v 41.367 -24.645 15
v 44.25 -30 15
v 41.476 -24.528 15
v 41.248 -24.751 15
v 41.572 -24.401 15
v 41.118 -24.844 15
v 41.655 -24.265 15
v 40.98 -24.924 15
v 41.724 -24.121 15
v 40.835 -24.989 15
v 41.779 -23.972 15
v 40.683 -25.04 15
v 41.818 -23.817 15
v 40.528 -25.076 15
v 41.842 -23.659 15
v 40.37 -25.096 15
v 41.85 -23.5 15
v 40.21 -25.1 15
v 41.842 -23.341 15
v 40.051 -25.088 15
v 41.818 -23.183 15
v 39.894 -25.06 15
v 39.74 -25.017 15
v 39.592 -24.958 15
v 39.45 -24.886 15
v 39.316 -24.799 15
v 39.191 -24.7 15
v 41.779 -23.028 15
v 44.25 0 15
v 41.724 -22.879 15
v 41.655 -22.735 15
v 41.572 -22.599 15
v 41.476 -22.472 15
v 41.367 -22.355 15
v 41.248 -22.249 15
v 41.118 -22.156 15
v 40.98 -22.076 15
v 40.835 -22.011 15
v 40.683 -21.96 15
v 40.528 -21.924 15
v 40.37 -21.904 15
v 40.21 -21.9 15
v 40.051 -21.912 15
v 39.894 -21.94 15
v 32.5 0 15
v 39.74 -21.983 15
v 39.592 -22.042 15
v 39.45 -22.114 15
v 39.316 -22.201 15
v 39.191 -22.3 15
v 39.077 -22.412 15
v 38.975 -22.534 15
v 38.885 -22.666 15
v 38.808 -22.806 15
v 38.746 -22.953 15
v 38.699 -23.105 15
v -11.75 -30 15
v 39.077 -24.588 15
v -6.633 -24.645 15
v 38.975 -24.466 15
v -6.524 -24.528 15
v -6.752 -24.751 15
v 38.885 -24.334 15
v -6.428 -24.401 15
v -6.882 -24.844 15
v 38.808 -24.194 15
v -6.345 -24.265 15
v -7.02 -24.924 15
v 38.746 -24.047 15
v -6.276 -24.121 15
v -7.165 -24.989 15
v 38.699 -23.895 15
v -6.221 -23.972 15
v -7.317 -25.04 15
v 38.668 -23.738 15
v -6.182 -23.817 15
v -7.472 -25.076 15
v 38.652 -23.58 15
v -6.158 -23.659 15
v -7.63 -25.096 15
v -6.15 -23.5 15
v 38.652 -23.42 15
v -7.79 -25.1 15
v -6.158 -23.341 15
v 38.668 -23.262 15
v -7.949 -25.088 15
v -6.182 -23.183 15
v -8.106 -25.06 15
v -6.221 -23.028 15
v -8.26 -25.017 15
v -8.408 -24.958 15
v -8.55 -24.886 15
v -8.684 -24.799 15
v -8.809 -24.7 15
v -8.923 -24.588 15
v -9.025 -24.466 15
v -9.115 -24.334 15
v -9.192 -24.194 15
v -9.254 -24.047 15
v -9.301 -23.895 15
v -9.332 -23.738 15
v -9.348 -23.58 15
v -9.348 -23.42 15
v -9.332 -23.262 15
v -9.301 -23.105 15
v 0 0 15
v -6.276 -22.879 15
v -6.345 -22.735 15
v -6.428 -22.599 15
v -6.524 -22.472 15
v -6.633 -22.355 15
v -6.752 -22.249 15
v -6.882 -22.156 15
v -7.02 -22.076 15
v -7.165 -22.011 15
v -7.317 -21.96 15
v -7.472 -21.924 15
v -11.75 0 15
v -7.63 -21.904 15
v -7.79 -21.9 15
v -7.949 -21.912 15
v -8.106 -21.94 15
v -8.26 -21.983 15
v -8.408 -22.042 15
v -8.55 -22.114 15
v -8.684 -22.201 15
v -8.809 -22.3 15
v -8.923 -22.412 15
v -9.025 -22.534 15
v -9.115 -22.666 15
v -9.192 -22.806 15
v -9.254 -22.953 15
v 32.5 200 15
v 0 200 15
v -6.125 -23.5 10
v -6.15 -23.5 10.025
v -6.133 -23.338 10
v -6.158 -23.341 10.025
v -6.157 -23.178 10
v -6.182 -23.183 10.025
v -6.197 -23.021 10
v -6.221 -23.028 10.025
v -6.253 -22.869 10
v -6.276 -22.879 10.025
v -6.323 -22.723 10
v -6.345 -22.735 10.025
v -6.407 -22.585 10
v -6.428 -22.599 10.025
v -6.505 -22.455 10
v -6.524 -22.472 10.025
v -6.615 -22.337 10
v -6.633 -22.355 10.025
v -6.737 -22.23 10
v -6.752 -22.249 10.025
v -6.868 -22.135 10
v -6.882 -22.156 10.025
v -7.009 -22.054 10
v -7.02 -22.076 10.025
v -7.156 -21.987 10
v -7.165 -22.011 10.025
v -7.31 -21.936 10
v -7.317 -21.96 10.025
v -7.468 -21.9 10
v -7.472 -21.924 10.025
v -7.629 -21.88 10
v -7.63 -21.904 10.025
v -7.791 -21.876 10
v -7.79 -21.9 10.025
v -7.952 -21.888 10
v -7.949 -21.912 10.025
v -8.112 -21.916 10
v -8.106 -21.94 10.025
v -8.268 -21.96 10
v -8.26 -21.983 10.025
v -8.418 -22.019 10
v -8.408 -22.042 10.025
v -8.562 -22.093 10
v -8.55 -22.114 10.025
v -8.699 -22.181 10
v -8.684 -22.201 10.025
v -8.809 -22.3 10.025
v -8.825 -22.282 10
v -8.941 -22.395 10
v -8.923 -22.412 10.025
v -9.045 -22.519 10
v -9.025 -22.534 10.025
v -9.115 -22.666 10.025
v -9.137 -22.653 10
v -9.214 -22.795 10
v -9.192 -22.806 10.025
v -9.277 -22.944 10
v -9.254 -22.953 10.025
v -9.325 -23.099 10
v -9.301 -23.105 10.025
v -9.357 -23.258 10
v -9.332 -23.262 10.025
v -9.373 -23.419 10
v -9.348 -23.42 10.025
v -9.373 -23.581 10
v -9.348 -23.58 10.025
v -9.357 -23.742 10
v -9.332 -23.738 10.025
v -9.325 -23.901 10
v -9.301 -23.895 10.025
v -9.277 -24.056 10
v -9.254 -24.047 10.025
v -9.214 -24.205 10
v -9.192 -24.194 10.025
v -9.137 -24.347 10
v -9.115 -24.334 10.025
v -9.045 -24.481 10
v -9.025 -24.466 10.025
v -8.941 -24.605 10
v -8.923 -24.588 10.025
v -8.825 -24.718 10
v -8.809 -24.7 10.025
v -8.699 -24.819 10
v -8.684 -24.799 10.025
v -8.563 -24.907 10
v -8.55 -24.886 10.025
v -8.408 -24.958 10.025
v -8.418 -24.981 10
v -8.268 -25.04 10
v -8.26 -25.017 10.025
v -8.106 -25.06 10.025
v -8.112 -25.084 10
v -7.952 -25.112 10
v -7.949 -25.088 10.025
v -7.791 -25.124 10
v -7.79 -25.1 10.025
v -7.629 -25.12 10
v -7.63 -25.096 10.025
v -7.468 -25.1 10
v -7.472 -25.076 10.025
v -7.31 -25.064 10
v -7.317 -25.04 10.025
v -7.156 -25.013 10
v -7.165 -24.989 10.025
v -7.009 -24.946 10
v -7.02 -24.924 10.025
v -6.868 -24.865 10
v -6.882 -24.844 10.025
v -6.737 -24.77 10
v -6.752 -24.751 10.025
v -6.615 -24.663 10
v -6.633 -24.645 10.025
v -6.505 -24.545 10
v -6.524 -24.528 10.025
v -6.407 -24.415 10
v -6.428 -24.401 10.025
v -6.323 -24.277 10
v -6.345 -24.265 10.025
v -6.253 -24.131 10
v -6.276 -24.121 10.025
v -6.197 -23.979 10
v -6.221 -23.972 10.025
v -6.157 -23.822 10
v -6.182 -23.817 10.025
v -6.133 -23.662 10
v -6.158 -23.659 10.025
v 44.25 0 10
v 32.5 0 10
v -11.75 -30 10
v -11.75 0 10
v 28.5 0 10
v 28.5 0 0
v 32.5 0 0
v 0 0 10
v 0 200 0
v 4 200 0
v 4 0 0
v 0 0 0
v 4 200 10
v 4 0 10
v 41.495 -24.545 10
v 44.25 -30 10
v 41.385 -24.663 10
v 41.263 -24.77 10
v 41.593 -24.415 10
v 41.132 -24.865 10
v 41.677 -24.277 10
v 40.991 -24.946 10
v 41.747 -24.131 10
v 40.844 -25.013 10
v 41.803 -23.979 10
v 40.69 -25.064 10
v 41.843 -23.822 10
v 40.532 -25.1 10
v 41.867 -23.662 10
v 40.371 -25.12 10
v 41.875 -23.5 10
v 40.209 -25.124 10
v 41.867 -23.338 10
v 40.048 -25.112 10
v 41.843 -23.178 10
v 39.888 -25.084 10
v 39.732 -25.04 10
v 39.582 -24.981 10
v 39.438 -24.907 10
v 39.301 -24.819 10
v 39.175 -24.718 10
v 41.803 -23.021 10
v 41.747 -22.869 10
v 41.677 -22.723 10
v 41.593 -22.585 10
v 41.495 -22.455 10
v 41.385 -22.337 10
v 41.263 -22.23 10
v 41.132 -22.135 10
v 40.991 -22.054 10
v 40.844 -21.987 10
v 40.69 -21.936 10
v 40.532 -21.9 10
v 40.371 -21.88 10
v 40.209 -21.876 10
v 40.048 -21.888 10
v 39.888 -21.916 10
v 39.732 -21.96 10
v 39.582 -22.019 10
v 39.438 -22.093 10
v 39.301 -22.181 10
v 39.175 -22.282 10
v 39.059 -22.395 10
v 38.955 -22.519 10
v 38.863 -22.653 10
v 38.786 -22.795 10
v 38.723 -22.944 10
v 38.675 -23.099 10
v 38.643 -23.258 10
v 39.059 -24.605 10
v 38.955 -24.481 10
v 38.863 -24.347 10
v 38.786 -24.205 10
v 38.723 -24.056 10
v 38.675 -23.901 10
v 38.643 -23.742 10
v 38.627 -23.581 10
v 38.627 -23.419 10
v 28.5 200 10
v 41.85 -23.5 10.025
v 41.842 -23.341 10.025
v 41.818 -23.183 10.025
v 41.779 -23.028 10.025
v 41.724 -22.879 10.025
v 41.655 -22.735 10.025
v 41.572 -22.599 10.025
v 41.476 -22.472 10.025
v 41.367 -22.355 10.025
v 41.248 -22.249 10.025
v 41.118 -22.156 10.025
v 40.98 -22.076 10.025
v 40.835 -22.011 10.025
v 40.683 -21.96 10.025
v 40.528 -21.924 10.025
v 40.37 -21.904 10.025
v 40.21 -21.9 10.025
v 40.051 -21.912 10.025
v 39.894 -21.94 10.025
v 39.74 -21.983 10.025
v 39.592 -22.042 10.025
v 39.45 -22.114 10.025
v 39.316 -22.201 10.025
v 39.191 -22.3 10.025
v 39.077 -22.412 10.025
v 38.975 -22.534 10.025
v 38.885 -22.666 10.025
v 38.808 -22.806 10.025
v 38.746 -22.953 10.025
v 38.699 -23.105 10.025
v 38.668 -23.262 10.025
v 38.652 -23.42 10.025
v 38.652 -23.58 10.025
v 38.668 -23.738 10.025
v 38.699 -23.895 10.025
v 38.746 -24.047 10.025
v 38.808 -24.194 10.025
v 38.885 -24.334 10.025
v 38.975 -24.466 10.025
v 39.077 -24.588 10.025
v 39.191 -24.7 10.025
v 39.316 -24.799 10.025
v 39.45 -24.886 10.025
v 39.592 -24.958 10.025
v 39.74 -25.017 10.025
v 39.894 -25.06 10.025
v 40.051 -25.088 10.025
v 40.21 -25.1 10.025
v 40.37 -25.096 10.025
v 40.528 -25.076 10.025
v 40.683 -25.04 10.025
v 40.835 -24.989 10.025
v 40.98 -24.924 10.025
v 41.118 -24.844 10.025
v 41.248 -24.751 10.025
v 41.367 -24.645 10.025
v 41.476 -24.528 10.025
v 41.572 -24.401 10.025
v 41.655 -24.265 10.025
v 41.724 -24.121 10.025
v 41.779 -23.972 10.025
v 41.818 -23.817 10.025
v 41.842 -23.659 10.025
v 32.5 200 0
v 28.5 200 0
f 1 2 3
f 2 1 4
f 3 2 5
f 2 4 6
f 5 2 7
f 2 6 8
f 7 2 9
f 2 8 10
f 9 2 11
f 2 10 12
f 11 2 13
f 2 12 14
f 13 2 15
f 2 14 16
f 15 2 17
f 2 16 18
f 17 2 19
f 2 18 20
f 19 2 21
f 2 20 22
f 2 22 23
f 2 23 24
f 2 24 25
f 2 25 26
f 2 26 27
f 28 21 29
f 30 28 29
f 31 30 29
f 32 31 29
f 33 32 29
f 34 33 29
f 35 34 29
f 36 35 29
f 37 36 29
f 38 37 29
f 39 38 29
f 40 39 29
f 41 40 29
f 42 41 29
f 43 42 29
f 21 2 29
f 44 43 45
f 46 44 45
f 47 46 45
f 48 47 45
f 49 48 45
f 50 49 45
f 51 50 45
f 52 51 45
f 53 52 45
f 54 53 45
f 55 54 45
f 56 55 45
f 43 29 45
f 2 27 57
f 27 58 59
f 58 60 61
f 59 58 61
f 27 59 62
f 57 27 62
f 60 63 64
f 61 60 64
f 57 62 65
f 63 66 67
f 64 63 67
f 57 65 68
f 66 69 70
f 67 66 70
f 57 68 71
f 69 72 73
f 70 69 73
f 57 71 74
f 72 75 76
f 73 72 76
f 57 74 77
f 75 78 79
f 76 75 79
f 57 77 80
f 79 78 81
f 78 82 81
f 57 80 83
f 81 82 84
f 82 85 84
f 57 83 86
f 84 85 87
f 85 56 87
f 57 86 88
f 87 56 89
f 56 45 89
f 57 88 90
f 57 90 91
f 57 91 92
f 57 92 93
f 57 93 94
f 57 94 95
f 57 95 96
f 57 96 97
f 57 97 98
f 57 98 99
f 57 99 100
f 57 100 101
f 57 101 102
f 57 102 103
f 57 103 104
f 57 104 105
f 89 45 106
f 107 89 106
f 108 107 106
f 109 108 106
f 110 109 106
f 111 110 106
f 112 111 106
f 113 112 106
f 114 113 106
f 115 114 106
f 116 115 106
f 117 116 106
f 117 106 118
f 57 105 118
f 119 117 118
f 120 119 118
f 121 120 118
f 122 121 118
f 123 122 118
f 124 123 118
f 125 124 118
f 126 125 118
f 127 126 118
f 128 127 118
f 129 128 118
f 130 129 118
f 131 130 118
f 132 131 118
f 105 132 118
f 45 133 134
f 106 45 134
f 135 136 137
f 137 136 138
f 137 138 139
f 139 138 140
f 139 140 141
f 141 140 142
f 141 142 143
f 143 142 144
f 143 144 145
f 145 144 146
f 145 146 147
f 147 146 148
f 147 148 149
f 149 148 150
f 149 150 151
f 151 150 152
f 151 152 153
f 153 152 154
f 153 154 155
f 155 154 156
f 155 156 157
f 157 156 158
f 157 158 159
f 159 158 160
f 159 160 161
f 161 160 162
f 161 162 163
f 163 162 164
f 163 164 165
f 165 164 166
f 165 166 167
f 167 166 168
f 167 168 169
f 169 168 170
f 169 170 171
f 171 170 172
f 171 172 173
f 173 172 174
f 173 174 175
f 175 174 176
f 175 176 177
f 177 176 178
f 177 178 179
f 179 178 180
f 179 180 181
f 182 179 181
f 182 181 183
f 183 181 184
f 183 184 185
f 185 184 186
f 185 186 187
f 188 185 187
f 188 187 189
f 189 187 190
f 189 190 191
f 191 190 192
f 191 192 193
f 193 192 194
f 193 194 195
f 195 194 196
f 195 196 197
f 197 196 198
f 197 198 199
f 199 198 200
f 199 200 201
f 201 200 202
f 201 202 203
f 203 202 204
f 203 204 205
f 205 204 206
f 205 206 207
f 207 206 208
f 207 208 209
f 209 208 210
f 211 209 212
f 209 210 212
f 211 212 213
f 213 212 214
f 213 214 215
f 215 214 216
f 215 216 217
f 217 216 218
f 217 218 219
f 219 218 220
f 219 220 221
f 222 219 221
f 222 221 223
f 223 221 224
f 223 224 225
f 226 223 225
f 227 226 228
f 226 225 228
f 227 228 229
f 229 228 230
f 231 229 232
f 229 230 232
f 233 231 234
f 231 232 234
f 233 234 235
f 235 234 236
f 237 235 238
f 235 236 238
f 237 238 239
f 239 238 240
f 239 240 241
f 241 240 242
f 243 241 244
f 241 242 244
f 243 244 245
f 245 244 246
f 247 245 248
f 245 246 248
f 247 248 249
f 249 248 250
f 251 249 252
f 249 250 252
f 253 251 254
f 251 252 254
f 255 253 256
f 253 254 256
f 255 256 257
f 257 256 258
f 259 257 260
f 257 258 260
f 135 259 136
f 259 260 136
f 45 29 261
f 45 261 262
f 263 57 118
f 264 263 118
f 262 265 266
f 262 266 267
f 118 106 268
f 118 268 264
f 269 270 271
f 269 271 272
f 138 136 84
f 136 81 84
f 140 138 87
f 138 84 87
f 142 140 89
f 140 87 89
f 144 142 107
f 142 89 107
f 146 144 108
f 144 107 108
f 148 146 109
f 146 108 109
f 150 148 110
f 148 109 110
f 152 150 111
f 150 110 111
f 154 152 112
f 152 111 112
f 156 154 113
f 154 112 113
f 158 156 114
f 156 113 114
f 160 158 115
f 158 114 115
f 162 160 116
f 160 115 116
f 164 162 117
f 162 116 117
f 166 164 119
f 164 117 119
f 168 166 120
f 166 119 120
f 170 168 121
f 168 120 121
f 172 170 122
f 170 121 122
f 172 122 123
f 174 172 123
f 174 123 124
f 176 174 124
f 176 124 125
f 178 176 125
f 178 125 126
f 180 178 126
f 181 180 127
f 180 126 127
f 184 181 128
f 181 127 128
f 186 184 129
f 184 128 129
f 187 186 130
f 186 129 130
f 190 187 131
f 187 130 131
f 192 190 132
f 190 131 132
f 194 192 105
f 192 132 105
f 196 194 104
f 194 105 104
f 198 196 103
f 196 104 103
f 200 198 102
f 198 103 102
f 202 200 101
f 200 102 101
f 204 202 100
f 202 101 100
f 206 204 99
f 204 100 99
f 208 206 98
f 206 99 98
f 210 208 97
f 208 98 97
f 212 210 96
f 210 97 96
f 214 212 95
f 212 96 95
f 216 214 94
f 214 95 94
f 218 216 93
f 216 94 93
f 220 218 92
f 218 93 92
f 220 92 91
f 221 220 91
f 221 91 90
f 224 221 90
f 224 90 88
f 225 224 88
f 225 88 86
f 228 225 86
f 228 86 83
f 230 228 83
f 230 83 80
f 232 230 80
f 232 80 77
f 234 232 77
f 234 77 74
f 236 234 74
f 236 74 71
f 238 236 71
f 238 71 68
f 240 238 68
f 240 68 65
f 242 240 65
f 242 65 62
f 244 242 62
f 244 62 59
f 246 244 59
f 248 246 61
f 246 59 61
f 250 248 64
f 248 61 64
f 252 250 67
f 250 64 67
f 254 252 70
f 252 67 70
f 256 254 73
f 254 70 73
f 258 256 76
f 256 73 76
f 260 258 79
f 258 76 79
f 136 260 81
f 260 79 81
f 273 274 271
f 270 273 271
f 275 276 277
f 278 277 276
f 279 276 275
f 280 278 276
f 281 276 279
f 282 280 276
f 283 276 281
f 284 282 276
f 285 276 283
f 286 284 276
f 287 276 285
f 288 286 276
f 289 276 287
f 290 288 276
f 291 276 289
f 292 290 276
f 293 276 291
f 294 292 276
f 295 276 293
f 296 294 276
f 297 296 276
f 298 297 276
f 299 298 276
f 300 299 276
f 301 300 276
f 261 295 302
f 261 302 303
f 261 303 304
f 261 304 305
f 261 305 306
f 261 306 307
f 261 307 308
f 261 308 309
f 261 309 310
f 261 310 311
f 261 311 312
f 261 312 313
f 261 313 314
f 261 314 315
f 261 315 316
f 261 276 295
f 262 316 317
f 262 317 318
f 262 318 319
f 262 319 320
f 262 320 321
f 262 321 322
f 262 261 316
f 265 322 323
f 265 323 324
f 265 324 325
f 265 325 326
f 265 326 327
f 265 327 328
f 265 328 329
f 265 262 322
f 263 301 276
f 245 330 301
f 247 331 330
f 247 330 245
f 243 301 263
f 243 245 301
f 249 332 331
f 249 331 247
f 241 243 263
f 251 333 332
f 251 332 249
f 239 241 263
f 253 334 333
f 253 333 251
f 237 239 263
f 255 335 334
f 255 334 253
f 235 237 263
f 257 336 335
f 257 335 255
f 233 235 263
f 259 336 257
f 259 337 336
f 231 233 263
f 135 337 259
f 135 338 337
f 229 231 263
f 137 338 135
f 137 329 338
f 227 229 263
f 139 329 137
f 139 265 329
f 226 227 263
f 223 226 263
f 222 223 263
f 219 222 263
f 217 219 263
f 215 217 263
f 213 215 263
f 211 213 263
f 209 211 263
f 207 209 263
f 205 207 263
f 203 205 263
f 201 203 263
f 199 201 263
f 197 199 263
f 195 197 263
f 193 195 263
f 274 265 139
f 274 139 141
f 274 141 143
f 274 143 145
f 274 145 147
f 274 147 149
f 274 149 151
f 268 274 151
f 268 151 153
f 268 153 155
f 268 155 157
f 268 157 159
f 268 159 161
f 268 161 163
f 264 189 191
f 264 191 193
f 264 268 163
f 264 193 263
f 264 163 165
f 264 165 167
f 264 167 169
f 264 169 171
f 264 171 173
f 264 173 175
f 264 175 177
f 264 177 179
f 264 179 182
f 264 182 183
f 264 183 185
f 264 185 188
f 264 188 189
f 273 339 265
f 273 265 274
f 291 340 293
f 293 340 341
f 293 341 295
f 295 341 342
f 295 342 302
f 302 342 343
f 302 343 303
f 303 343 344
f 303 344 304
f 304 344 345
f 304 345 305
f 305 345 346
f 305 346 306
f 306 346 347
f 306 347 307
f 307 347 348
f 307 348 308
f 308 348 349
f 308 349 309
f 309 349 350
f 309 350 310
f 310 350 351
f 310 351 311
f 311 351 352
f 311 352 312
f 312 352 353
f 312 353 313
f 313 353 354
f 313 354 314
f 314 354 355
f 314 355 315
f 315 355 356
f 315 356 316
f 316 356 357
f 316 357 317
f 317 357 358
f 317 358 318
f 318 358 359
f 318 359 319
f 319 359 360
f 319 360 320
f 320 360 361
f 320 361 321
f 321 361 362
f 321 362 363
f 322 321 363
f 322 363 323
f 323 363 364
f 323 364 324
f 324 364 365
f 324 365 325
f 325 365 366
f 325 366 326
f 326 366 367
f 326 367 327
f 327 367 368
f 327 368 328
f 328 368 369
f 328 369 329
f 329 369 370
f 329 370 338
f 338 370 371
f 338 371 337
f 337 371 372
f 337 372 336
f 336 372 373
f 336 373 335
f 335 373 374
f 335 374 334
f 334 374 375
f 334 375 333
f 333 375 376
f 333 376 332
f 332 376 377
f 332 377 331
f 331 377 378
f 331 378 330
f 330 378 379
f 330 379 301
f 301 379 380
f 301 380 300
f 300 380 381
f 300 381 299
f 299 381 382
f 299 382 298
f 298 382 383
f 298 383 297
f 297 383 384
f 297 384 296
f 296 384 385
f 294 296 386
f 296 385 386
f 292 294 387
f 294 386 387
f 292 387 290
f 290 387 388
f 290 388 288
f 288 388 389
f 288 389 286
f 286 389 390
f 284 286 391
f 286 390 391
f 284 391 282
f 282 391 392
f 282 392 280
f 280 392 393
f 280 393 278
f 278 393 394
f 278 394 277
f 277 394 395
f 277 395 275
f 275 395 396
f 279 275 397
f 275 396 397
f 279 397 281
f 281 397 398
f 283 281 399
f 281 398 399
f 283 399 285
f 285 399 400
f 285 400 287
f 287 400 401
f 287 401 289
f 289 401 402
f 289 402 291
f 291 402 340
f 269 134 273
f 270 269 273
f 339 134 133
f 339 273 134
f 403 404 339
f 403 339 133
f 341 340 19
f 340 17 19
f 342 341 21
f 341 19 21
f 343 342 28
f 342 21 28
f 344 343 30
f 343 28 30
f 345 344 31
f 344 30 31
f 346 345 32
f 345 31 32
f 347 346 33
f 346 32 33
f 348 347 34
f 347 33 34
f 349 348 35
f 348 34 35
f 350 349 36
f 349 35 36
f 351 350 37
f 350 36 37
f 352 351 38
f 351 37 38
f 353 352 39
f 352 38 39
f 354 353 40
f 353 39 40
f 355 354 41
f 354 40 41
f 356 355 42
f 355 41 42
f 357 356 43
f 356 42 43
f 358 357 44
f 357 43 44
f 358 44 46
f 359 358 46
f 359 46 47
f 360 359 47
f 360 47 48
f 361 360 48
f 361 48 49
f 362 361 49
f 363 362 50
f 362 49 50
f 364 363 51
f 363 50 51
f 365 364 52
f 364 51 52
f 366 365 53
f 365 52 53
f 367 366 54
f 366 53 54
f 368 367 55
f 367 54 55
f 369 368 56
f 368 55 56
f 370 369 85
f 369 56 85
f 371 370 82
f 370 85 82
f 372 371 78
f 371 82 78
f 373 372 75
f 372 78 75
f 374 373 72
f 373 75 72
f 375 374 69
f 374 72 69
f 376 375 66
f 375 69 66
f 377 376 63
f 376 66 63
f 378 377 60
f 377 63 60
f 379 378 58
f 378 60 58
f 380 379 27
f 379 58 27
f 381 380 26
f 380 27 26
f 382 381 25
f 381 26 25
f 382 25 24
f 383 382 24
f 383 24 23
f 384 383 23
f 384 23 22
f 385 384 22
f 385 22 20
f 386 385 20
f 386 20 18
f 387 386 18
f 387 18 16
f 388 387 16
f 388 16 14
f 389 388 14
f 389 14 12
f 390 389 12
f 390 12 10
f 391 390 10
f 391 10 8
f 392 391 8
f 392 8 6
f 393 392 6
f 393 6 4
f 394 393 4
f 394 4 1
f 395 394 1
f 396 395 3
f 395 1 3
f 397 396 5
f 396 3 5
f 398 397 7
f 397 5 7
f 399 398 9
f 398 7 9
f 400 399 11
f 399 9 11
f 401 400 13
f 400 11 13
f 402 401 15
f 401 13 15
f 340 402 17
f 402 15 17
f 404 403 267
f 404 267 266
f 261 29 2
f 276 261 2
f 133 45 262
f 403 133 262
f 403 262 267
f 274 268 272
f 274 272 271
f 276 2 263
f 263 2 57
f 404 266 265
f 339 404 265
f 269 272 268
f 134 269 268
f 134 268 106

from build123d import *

# Parameters (mm, degrees)
BOSS_EXTRUDE1_DEPTH            = 200
BOSS_EXTRUDE2_DEPTH            = 5
M3_CLEARANCE_HOLE1_D           = 3.2
M3_CLEARANCE_HOLE1_CSINK_D     = 3.25
M3_CLEARANCE_HOLE1_CSINK_ANGLE = 90


with BuildPart() as part:
    # Sketch1 → Boss-Extrude1 (new body)
    with BuildSketch(Plane(origin=(0, 0, 0), x_dir=(1, 0, 0), z_dir=(0, 1, 0))):
        Polygon((0, 0), (0, -15), (32.5, -15), (32.5, 0), (28.5, 0), (28.5, -10), (4, -10), (4, 0), align=None)
    extrude(amount=BOSS_EXTRUDE1_DEPTH)

    # Sketch2 → Boss-Extrude2 (add)
    with BuildSketch(Plane.XY.offset(15)):
        Polygon((32.5, 0), (44.25, 0), (44.25, -30), (-11.75, -30), (-11.75, 0), (0, 0), align=None)
    extrude(amount=-BOSS_EXTRUDE2_DEPTH)

    # M3 Clearance Hole1 (through all)
    with Locations(Plane(origin=(0, 0, 10), x_dir=(-1, 0, 0), z_dir=(0, 0, -1))):
        with Locations((7.75, -23.5), (-40.25, -23.5)):
            CounterSinkHole(M3_CLEARANCE_HOLE1_D / 2, M3_CLEARANCE_HOLE1_CSINK_D / 2, counter_sink_angle=M3_CLEARANCE_HOLE1_CSINK_ANGLE)


solid = part.part
